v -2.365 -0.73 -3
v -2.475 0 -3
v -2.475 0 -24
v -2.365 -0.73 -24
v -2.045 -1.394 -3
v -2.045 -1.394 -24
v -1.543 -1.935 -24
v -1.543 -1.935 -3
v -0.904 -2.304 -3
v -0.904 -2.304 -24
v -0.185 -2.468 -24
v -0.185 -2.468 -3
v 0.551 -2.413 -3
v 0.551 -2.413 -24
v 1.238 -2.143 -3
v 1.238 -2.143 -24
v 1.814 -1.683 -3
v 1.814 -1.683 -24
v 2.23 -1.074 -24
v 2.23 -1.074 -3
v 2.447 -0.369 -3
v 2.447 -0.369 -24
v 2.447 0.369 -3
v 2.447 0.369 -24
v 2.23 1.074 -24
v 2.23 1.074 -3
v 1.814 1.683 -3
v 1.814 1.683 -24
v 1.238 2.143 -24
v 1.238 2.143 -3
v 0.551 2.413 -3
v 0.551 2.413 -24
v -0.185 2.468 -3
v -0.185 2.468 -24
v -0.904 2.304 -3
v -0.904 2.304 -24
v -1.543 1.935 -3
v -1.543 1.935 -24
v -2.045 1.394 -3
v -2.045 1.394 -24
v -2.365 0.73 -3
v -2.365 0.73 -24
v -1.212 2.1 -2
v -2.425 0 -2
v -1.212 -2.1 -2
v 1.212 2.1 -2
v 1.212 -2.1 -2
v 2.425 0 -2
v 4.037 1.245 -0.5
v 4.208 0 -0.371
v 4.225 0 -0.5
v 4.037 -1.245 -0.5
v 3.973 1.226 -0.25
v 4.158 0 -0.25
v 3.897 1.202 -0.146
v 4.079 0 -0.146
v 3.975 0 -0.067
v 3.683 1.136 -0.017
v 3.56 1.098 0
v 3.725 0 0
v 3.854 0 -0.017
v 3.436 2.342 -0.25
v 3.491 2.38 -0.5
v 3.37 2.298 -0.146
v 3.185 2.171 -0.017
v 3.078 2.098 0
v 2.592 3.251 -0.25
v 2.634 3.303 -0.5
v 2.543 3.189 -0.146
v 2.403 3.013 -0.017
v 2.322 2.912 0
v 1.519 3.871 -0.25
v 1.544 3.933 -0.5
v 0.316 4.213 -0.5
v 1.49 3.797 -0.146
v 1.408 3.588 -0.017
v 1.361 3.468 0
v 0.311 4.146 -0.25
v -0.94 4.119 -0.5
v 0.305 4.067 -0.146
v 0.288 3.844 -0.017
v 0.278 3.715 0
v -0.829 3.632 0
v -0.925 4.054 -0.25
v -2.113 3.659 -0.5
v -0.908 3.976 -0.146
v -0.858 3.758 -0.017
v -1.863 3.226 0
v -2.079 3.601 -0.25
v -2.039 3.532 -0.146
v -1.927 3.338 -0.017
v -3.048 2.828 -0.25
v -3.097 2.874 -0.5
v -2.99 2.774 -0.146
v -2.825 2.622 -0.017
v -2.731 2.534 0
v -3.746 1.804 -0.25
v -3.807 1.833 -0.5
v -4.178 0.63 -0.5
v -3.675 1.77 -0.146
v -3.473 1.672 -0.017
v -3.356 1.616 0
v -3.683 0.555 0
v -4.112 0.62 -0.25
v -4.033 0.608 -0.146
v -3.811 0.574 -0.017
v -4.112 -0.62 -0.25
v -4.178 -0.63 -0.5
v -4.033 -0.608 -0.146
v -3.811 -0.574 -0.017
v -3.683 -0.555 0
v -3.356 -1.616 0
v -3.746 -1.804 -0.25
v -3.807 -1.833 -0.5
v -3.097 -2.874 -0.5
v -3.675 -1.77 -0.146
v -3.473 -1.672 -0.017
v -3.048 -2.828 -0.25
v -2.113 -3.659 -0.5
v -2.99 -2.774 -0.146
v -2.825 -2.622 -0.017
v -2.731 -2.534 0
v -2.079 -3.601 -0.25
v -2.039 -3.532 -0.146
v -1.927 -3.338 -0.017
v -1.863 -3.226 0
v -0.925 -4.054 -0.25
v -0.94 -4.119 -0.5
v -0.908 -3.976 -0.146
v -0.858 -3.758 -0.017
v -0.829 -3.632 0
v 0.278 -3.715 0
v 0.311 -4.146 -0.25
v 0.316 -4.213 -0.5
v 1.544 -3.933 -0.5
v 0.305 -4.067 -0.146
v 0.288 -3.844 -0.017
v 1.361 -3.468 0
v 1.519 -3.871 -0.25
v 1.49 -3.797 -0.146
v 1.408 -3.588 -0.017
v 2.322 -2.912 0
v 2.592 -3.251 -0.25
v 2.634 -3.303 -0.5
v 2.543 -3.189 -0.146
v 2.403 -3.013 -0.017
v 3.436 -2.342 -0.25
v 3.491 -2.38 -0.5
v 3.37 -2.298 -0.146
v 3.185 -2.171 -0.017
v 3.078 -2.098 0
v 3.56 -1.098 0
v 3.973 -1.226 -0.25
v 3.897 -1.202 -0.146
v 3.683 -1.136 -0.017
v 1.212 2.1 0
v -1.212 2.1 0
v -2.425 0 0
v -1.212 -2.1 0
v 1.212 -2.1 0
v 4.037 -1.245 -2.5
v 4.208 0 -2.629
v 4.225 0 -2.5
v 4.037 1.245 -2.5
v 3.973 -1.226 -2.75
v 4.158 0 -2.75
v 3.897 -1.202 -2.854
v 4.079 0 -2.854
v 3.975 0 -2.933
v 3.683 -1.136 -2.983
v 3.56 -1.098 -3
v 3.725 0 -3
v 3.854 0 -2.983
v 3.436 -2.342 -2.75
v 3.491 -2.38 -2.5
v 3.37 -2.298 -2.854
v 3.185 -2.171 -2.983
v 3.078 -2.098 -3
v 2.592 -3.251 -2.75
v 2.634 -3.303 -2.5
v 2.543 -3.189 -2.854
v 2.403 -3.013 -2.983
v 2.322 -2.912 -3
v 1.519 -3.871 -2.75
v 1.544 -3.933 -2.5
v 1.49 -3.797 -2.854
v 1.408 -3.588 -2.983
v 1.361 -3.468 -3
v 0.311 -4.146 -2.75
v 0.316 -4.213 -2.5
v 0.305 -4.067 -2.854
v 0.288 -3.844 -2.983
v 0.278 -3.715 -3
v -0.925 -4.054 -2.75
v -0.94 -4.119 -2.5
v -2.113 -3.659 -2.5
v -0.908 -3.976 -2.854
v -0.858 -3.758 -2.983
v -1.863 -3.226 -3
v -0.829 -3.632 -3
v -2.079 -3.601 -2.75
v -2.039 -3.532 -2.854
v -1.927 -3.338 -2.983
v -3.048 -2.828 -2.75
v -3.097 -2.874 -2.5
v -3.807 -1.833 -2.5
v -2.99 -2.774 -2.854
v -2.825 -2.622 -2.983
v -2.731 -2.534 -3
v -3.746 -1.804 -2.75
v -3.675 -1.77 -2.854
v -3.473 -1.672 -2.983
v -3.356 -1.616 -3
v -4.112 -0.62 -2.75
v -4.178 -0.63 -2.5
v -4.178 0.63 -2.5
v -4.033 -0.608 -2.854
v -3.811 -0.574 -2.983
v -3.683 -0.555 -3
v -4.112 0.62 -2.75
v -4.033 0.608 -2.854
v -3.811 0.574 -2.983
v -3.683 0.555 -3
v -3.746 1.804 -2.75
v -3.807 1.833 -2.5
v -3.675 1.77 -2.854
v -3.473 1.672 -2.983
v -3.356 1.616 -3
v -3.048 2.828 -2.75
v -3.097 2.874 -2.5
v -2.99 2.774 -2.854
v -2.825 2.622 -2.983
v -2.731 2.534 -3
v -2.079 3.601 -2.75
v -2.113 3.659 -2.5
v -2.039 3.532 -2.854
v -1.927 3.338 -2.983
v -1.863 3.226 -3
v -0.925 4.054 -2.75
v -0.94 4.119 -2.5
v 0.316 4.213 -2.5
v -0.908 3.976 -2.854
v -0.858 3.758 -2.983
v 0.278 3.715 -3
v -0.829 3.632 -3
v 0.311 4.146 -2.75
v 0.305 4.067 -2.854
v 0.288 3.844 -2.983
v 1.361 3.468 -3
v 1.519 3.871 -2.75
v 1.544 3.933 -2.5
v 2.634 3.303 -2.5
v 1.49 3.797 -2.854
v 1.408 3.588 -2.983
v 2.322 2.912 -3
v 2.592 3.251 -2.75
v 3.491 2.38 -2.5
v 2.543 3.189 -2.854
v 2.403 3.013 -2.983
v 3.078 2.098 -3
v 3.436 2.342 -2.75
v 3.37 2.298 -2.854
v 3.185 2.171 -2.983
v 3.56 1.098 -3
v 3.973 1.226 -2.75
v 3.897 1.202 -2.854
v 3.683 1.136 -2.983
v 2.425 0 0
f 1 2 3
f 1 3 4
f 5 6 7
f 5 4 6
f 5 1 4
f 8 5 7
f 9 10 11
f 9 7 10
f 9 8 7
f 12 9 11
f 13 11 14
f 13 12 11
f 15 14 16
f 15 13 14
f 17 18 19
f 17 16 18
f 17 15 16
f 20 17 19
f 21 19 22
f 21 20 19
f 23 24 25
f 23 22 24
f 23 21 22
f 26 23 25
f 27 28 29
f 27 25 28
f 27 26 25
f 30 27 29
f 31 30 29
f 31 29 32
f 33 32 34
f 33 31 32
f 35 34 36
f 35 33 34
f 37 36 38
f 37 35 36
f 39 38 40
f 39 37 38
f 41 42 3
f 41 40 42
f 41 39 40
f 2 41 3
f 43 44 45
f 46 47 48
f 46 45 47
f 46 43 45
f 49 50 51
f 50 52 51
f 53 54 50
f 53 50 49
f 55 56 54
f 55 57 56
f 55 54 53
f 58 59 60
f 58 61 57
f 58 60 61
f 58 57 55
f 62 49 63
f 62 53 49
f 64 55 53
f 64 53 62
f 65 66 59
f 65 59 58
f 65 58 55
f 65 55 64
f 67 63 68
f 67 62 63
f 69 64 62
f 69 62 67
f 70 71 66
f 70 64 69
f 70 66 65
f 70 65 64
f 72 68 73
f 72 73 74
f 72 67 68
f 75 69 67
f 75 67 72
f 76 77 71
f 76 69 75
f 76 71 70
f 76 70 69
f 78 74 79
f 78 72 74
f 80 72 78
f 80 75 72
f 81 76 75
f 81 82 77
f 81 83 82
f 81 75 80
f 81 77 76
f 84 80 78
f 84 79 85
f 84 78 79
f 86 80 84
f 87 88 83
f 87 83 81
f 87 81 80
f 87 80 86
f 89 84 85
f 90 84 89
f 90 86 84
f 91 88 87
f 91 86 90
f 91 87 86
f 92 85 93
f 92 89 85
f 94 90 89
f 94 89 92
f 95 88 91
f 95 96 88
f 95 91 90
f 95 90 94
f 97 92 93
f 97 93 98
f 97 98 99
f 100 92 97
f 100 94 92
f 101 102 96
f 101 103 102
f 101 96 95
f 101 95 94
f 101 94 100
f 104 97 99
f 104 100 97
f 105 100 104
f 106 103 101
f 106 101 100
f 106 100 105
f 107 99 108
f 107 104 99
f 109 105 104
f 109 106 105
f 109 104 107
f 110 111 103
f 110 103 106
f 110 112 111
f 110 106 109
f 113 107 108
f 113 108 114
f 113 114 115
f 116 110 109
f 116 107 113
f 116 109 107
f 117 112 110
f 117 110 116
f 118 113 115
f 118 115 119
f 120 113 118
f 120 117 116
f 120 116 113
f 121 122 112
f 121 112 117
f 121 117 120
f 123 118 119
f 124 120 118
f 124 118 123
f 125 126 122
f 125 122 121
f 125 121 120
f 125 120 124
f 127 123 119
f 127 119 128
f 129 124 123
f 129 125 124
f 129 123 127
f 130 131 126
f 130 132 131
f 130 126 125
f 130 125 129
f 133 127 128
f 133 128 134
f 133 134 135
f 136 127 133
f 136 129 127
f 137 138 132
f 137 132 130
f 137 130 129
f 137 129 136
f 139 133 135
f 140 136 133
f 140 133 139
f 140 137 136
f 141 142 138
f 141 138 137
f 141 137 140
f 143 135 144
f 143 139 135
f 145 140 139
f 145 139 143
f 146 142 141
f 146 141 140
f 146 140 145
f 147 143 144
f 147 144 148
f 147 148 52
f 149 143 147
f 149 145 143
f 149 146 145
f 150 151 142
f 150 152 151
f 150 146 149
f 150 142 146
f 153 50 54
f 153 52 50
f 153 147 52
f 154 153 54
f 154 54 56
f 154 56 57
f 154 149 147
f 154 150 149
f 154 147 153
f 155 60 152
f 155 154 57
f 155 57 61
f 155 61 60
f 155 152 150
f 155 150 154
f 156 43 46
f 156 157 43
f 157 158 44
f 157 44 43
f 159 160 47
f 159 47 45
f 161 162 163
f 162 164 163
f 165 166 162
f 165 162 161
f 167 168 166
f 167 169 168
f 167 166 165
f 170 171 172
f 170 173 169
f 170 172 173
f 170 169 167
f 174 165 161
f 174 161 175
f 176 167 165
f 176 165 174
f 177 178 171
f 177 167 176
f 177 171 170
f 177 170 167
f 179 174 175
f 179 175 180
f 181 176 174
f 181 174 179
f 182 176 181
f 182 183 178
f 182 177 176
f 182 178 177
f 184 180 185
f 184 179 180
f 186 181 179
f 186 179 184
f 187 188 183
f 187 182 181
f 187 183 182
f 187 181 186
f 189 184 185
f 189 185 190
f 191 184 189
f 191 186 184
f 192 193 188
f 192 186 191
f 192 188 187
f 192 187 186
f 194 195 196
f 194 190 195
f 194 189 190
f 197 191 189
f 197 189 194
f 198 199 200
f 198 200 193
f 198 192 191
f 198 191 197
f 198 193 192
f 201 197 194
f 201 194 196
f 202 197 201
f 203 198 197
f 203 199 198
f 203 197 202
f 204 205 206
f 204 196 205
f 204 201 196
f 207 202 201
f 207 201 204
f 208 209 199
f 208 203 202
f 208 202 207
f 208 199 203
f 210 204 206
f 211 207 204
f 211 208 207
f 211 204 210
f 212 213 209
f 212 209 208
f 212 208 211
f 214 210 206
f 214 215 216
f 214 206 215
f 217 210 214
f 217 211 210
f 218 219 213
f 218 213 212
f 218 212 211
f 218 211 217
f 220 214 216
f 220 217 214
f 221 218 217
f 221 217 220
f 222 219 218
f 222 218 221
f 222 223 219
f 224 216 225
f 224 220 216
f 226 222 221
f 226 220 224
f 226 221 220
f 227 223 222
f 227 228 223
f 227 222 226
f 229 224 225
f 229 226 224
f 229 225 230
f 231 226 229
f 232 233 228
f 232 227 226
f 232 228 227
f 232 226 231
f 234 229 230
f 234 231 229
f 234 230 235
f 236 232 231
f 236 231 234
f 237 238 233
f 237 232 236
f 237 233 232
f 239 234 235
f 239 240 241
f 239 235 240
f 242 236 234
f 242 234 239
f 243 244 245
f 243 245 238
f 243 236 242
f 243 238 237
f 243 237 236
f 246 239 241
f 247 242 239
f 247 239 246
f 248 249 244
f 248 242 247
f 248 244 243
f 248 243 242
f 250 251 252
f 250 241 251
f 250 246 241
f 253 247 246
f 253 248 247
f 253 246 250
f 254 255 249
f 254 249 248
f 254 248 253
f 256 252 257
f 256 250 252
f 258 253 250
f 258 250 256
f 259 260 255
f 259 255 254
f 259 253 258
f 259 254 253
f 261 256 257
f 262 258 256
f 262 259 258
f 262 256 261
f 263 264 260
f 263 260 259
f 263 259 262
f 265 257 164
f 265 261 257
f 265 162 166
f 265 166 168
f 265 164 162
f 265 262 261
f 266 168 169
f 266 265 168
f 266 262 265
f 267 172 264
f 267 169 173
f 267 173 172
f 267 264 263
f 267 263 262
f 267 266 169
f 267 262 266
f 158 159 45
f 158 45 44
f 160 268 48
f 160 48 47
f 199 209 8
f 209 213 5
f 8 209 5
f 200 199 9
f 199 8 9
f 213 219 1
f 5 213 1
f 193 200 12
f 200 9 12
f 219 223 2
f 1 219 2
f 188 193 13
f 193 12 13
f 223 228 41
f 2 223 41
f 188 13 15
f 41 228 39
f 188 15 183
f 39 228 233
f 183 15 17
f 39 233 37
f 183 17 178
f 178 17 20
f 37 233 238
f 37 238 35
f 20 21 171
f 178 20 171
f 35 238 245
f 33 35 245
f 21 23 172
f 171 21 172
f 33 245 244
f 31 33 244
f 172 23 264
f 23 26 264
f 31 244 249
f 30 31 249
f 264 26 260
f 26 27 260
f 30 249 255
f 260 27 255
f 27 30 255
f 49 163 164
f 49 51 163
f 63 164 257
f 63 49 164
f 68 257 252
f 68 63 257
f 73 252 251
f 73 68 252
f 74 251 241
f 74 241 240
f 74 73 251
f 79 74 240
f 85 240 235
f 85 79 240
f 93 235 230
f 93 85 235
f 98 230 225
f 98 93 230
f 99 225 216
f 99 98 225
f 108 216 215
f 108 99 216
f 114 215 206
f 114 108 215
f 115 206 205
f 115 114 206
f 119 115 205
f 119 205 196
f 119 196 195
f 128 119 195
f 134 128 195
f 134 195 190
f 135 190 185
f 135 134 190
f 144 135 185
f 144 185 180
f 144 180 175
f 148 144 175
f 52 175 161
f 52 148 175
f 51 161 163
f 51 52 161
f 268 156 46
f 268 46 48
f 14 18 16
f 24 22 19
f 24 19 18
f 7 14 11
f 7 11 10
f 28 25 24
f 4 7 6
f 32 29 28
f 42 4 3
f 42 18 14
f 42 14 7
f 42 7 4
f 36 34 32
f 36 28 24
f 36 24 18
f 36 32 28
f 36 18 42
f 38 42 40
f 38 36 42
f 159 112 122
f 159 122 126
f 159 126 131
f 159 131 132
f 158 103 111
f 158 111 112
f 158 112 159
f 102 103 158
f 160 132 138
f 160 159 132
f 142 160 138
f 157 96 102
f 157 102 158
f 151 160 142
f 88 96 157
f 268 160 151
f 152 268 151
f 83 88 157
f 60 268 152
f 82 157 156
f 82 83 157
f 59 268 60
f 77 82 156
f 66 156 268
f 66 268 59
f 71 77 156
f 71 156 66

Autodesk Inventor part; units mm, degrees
ref_plane "YZ Plane" through (0, 0, 0) normal (1, 0, 0) x (0, 1, 0)
ref_plane "XZ Plane" through (0, 0, 0) normal (0, 1, 0) x (-1, 0, 0)
sketch "Sketch1" plane through (0, 0, 0) normal (0, 0, 1) x (1, 0, 0)
  circle A0 centre (0, 0) radius 4.225
  dimension "d0" = 8.45
extrude "Extrusion1" add sketch "Sketch1" against normal blind 3
sketch "Sketch2" plane through (0, 0, -3) normal (0, 0, -1) x (-1, 0, 0)
  circle A0 centre (0, 0) radius 2.475
  dimension "d3" = 4.95
extrude "Extrusion2" add sketch "Sketch2" along normal blind 40
thread "Thread1" size "M5x0.8" class "6g" standard "ANSI Metric M Profile" length 27
sketch "Sketch3" plane through (0, 0, 0) normal (0, 0, 1) x (1, 0, 0)
  line L0 (-1.2124, -2.1) -> (-2.4249, 0)
  line L1 (-2.4249, 0) -> (-1.2124, 2.1)
  line L2 (-1.2124, 2.1) -> (1.2124, 2.1)
  line L3 (1.2124, 2.1) -> (2.4249, 0)
  line L4 (2.4249, 0) -> (1.2124, -2.1)
  line L5 (1.2124, -2.1) -> (-1.2124, -2.1)
  line L6 (-4.5, -0.75) -> (4.5, -0.75)
  line L7 (4.5, -0.75) -> (4.5, 0.75)
  line L8 (4.5, 0.75) -> (-4.5, 0.75)
  line L9 (-4.5, 0.75) -> (-4.5, -0.75)
  line L10 (-4.5, -0.75) -> (4.5, 0.75) construction
  line L11 (4.5, -0.75) -> (-4.5, 0.75) construction
  point P0 (0, 0)
  point P1 (0, 0)
  dimension "d8" = 2.1
  dimension "d13" = 4.2
  dimension "d18" = 9
  dimension "d19" = 1.5
extrude "Extrusion3" cut sketch "Sketch3" against normal blind 2 contours L0 L6 L4 L5 | L0 L1 L8 L3 L4 L6 | L1 L2 L3 L8
fillet "Fillet1" radius 0.5 2 edges at (-4.225, 0, 0) (-4.225, 0, -3)
ref_plane "Work Plane1" through (0, 0, -18.5) normal (0, 0, -1) x (-1, 0, 0)
sketch "Sketch4" plane through (0, 0, -43) normal (0, 0, -1) x (-1, 0, 0)
  circle A0 centre (0, 0) radius 2.475 projected
extrude "Extrusion4" cut sketch "Sketch4" against normal blind 19
properties part number "ScrewM5x40_Machined" material "Aluminum 6061-AHC"
